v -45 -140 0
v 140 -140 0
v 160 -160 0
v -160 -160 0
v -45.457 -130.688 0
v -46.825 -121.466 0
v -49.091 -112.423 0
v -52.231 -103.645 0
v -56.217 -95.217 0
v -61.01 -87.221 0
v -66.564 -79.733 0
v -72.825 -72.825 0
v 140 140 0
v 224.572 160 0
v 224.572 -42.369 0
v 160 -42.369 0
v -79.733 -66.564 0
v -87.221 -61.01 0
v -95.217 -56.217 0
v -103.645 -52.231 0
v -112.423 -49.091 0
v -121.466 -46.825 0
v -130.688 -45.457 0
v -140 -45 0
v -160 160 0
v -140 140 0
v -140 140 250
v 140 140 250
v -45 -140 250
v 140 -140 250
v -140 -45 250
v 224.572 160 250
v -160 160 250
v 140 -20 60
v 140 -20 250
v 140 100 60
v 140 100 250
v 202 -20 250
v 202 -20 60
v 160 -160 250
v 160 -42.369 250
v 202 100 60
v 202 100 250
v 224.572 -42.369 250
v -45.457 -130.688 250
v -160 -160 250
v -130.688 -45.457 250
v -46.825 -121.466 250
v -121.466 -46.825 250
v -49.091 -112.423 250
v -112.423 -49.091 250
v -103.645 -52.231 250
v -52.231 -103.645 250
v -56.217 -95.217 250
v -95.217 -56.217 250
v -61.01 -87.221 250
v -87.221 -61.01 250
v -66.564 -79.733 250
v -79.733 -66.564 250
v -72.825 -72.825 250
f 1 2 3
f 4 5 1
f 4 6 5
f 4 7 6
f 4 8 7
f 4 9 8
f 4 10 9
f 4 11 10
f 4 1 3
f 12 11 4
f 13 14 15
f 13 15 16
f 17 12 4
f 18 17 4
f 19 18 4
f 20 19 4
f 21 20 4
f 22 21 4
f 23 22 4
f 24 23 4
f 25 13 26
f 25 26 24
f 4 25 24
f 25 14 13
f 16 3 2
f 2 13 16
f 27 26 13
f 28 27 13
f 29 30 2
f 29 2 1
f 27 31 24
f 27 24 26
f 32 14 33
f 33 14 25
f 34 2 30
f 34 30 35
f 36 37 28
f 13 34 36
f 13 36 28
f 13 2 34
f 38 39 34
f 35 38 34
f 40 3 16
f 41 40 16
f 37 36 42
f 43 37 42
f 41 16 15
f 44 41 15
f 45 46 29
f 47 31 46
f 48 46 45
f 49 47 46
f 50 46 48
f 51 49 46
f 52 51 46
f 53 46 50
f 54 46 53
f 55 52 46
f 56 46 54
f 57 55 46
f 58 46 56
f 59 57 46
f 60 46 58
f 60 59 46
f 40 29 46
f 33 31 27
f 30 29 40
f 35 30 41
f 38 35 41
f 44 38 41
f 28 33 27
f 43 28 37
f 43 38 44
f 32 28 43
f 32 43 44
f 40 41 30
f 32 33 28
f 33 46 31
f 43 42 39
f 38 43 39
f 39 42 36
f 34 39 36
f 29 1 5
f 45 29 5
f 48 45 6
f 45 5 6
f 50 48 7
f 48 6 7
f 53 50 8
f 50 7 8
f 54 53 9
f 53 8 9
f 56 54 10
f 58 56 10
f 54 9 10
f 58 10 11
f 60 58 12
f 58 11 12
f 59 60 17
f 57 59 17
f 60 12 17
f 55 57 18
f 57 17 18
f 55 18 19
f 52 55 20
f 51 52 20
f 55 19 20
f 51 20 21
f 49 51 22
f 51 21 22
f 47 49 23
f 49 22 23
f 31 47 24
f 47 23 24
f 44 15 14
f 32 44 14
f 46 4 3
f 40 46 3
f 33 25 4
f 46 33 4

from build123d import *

# Parameters (mm, degrees)
EXTRUDE_1_DEPTH = 250
SKETCH_2_W      = 62
SKETCH_2_H      = 120
EXTRUDE_2_DEPTH = 60


with BuildPart() as part:
    # 草图1 → 凸台-拉伸1 (new body)
    with BuildSketch(Plane.XY):
        Polygon((-160, -160), (160, -160), (160, -42.368693821), (224.572052692, -42.368693821), (224.572052692, 160), (-160, 160), align=None)
        with BuildLine():
            Line((-140, 140), (140, 140))
            Line((140, 140), (140, 100))
            Line((140, 100), (202, 100))
            Line((202, 100), (202, -20))
            Line((202, -20), (140, -20))
            Line((140, -20), (140, -140))
            Line((140, -140), (-45, -140))
            ThreePointArc((-45, -140), (-72.824855787, -72.824855787), (-140, -45))
            Line((-140, -45), (-140, 140))
        make_face(mode=Mode.SUBTRACT)
    extrude(amount=EXTRUDE_1_DEPTH)

    # 草图2 → 凸台-拉伸2 (add)
    with BuildSketch(Plane(origin=(0, 0, 0), x_dir=(-1, 0, 0), z_dir=(0, 0, -1))):
        with Locations((-171, 40)):
            Rectangle(SKETCH_2_W, SKETCH_2_H)
    extrude(amount=-EXTRUDE_2_DEPTH)


solid = part.part
